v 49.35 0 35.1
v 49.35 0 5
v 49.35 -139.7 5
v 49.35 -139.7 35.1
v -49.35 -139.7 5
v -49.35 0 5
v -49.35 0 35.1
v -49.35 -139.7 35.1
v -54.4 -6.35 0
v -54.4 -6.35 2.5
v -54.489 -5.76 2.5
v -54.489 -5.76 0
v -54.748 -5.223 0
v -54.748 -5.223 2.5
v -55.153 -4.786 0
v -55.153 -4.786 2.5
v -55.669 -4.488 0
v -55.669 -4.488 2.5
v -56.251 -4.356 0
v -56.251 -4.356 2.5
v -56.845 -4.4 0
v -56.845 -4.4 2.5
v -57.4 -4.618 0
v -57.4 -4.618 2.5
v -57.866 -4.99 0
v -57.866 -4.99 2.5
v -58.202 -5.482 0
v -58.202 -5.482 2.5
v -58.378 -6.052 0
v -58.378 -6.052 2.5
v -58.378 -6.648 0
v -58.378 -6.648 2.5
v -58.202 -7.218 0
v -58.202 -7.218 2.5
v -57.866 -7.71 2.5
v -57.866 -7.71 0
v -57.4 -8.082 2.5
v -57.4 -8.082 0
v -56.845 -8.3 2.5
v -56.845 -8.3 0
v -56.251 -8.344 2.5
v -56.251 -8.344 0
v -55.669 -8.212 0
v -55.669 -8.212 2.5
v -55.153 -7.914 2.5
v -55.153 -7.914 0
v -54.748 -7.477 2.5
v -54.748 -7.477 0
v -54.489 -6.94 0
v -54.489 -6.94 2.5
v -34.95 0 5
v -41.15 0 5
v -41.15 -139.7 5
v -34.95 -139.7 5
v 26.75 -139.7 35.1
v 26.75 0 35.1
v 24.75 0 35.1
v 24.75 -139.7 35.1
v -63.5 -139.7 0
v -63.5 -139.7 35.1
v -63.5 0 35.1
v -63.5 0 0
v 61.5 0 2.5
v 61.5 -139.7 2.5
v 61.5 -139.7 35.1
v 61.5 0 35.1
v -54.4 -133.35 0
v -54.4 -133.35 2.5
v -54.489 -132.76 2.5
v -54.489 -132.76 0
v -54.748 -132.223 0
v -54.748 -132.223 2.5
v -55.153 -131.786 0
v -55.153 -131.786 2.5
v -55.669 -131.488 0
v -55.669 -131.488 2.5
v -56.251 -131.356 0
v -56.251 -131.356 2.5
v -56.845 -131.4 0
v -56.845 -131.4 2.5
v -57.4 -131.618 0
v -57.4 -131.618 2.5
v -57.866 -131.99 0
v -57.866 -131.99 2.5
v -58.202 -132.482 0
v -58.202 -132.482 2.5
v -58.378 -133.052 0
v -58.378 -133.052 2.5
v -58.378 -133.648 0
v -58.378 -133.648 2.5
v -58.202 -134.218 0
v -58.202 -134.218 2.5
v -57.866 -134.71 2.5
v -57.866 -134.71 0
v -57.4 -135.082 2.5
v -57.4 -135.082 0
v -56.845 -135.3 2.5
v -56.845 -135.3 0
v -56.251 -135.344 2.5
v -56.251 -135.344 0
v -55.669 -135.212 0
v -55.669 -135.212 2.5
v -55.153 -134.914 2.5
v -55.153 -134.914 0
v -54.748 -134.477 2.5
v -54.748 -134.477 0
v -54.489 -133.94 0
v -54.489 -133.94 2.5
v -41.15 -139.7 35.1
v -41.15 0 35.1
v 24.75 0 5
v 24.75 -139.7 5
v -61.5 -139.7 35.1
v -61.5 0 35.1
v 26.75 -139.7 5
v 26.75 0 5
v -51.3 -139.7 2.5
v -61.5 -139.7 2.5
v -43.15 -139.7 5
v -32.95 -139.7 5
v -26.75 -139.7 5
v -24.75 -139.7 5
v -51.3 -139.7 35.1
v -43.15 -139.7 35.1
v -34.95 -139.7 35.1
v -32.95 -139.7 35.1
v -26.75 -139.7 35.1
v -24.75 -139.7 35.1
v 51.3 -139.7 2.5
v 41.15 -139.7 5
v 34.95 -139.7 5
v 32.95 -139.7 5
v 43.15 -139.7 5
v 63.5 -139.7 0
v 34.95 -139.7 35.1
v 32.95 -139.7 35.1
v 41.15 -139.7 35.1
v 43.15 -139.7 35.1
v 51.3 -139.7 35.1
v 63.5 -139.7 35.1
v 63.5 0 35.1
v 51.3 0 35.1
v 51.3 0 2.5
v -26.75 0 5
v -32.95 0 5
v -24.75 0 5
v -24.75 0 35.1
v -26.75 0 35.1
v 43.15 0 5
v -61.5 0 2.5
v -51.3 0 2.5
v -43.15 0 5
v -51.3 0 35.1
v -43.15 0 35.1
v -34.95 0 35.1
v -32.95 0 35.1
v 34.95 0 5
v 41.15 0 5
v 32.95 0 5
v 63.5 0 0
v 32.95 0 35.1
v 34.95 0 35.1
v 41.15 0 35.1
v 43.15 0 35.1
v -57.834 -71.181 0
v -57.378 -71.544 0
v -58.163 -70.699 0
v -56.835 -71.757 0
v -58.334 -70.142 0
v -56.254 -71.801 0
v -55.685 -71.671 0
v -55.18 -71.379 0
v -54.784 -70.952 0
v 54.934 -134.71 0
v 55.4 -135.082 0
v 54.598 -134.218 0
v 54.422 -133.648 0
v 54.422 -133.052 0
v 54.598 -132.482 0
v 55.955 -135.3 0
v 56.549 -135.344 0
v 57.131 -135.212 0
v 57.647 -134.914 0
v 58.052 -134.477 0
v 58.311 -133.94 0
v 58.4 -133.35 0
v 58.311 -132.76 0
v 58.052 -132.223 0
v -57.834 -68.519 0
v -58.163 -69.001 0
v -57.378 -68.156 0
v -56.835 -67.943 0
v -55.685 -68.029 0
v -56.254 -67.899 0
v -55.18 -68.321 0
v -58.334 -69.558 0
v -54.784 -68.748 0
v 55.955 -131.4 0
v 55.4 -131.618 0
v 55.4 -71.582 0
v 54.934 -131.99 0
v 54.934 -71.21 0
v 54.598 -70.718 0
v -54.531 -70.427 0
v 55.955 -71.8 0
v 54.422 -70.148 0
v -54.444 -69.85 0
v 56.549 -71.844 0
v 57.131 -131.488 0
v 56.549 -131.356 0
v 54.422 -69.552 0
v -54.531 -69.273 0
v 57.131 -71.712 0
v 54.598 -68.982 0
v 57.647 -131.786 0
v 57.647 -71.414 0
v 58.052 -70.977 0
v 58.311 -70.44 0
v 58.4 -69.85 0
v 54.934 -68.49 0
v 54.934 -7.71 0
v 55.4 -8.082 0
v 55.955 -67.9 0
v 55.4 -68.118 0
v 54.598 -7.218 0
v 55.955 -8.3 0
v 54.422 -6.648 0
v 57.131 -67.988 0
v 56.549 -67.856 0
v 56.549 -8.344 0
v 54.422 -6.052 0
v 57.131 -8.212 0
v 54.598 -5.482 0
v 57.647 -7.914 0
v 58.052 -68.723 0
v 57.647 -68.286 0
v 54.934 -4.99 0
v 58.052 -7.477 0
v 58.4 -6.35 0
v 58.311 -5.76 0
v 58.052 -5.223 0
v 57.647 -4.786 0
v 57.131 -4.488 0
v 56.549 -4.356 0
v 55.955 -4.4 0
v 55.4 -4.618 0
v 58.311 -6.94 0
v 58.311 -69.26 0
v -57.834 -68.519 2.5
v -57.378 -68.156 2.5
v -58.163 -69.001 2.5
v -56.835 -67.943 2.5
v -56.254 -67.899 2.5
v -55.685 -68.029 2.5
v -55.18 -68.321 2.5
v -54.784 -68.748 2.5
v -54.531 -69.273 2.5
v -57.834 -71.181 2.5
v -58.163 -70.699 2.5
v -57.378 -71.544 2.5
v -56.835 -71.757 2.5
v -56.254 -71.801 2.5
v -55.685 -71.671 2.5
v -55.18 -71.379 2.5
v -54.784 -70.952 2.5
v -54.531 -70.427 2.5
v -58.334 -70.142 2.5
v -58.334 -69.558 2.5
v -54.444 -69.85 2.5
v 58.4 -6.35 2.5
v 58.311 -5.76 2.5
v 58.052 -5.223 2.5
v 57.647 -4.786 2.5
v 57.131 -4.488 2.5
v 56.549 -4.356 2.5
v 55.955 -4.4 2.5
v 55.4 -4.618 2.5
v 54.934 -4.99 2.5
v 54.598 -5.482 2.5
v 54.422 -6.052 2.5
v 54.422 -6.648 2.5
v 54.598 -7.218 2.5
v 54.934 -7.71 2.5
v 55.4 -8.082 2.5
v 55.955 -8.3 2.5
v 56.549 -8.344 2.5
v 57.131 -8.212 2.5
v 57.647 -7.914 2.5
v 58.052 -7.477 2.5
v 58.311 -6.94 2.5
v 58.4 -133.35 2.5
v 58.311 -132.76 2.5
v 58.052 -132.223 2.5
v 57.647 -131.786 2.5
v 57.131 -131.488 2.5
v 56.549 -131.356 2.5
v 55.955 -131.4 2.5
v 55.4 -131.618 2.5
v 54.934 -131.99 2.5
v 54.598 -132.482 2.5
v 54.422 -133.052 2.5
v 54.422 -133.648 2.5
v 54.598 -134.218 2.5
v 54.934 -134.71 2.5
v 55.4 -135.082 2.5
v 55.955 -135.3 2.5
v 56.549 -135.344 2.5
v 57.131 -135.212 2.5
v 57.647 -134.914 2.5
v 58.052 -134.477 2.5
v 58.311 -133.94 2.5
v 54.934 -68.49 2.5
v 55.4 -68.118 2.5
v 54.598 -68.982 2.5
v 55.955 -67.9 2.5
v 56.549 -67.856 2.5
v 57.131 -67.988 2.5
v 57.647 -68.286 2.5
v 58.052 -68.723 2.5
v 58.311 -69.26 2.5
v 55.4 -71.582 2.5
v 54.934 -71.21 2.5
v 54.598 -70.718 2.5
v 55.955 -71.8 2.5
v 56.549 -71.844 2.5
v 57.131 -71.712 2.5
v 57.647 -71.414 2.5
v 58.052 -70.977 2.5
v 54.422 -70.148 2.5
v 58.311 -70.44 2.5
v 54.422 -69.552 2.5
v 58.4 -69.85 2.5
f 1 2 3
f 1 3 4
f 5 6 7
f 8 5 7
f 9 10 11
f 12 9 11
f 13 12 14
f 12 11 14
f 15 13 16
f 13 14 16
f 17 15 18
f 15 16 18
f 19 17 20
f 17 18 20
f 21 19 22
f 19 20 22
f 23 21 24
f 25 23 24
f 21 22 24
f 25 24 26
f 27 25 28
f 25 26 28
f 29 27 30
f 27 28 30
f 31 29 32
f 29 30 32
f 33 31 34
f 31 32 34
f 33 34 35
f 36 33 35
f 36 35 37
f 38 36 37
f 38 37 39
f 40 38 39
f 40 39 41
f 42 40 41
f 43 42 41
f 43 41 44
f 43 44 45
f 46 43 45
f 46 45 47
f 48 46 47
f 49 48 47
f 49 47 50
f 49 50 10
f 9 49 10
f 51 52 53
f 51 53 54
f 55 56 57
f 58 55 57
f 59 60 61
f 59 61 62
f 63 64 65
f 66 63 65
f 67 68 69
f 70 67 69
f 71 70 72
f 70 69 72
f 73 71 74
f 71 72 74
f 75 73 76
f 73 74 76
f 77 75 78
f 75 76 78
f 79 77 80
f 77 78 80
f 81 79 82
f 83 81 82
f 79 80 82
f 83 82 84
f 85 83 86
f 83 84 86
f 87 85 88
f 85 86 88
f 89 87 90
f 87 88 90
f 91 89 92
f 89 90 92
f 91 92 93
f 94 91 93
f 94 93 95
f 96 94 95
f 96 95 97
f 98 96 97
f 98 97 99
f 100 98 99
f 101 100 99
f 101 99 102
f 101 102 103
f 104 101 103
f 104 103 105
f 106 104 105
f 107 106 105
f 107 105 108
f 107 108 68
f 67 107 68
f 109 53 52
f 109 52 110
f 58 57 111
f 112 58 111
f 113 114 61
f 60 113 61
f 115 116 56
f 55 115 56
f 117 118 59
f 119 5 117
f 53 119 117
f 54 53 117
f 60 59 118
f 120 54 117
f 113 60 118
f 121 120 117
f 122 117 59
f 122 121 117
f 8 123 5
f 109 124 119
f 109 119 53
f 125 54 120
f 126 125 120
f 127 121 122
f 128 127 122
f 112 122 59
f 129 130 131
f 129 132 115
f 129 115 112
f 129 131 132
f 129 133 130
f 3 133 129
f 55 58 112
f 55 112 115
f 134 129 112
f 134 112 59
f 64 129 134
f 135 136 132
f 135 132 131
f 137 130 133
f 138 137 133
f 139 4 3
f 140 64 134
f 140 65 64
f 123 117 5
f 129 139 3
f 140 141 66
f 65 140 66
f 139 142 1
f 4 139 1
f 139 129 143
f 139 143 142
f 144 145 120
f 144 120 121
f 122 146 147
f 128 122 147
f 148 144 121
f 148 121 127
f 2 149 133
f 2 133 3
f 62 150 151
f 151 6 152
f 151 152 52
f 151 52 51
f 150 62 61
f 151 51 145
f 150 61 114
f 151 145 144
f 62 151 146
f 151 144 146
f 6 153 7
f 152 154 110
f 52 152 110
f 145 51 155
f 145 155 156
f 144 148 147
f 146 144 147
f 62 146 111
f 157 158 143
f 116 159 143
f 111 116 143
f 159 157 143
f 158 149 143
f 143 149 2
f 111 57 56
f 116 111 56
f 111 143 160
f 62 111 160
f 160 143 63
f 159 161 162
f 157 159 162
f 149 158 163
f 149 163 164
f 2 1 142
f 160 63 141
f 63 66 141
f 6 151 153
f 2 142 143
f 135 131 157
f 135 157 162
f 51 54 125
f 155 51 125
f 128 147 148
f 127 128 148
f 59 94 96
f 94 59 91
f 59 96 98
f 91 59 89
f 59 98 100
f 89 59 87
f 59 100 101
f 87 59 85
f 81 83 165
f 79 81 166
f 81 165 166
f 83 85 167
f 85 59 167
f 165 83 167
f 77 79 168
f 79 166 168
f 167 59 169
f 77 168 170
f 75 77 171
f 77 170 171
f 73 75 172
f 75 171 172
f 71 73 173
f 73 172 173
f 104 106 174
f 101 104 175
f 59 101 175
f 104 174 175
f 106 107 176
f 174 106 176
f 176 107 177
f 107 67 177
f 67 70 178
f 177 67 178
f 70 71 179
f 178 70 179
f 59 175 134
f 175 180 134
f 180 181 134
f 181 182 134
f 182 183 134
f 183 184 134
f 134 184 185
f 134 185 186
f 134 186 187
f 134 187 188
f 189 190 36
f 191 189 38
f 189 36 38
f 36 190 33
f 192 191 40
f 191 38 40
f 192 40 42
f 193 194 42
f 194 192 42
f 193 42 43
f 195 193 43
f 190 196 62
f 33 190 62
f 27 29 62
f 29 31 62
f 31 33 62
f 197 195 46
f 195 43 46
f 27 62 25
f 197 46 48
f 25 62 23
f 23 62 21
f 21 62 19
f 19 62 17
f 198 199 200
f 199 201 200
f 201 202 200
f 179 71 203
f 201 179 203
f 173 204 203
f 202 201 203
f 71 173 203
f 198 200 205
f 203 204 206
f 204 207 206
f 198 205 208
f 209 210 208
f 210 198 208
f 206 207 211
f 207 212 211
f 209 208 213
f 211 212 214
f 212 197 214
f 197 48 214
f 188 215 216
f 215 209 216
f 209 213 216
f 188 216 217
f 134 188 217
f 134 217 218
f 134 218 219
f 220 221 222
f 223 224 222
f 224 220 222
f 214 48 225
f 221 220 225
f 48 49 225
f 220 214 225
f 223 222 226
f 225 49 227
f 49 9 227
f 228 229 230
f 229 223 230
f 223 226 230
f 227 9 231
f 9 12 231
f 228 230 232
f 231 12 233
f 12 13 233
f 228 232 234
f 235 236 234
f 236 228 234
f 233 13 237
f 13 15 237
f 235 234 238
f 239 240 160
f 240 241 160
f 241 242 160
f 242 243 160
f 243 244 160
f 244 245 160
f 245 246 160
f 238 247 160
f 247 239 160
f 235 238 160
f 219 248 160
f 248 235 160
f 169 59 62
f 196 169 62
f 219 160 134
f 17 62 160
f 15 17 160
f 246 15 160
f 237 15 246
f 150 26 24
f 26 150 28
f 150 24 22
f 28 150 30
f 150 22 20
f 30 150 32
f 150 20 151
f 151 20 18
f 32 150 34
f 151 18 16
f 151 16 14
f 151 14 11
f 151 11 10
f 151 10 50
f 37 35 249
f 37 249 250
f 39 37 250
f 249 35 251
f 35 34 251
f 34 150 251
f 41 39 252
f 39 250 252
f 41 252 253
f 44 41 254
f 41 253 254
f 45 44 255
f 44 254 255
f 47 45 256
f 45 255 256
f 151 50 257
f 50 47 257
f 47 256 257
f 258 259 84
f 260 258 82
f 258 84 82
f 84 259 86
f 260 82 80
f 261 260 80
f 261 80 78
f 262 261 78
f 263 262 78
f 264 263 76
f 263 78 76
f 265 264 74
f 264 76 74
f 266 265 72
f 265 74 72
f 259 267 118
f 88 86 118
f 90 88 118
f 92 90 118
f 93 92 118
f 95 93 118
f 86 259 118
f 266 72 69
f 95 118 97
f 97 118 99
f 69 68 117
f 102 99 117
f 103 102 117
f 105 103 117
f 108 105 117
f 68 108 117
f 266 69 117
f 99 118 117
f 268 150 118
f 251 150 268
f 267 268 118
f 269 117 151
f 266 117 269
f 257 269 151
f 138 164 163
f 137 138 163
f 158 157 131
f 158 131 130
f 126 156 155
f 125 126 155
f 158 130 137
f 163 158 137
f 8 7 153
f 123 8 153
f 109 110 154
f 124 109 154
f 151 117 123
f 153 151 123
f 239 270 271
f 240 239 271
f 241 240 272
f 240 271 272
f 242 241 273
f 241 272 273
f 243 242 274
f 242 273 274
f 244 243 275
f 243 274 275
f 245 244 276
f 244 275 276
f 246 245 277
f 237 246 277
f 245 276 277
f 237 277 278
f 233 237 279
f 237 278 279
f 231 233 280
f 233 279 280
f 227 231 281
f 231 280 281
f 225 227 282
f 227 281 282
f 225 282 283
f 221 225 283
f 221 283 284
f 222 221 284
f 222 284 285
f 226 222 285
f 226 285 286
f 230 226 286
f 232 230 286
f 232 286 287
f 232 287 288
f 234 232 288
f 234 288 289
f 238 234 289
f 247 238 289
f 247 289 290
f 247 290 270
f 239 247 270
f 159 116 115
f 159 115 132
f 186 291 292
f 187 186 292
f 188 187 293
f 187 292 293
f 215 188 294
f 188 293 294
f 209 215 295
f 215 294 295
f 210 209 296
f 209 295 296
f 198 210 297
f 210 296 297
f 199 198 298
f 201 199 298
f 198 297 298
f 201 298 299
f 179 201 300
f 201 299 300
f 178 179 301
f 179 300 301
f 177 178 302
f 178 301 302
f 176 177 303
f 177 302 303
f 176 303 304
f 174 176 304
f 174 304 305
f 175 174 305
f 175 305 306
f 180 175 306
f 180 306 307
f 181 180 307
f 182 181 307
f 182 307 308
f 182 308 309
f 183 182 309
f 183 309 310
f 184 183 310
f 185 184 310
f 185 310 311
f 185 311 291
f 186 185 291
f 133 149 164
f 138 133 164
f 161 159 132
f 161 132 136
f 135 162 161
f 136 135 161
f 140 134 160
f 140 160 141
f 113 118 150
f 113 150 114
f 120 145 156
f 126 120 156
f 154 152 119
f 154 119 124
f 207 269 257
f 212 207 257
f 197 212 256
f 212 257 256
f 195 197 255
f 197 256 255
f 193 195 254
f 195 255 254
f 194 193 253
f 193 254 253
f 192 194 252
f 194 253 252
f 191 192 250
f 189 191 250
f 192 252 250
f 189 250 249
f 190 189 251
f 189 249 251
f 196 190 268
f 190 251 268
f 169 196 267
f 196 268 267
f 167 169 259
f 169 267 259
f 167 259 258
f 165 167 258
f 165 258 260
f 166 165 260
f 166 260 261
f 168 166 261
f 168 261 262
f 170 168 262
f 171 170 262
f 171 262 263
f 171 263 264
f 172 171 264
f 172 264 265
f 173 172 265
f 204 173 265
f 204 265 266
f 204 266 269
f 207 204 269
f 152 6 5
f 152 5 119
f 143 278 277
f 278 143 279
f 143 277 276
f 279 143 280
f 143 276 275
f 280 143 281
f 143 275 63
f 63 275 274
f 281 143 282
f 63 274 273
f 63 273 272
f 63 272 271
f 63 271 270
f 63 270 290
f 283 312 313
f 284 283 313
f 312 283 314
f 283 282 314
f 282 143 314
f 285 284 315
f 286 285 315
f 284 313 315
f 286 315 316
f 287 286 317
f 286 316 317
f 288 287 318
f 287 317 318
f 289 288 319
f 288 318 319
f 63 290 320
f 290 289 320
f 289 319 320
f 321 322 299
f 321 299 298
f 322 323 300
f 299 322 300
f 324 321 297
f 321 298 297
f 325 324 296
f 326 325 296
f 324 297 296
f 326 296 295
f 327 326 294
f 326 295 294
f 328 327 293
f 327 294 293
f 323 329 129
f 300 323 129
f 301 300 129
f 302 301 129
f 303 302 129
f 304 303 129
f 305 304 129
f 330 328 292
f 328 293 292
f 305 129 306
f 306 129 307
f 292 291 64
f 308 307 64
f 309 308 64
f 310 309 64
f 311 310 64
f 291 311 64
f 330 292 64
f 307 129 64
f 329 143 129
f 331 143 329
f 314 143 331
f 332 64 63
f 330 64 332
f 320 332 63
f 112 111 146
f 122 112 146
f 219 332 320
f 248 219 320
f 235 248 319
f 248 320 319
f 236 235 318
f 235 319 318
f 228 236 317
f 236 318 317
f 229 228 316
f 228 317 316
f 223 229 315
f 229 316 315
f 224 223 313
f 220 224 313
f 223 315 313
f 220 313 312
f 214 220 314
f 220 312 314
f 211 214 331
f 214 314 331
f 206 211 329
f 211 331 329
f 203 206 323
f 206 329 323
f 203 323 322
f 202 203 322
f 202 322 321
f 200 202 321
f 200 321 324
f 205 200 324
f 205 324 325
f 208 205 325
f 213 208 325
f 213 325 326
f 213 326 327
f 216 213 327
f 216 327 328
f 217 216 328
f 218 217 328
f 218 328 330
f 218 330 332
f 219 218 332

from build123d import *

# Parameters (mm, degrees)
F1_DEPTH = 139.7
F2_W     = 10.2
F2_H     = 32.6
F3_DEPTH = 150
F4_W     = 6.2
F4_H     = 32.647062
F4_H_2   = 32.911505
F4_H_3   = 34.58407
F4_H_4   = 35.141594
F4_H_5   = 35.977877
F4_H_6   = 40.159295
F5_DEPTH = 150
F6_DEPTH = 150
F7_R     = 2
F7_R_2   = 1.956251
F8_DEPTH = 25


with BuildPart() as f1:
    # F0 (on Front) → F1 (new body)
    with BuildSketch(Plane.XZ):
        Polygon((-24.75, 35.1), (-63.5, 35.1), (-63.5, 0), (63.5, 0), (63.5, 35.1), (24.75, 35.1), (24.75, 5), (-24.75, 5), align=None)
    extrude(amount=F1_DEPTH)

    # F2 (on face) → F3 (cut)
    with BuildSketch(Plane.XZ.offset(139.7)):
        with Locations((-56.4, 18.8)):
            Rectangle(F2_W, F2_H)
        with Locations((56.4, 18.8)):
            Rectangle(F2_W, F2_H)
    extrude(amount=-F3_DEPTH, mode=Mode.SUBTRACT)

    # F4 (on Front) → F5 (cut)
    with BuildSketch(Plane.XZ):
        with Locations((-29.85, 21.323531)):
            Rectangle(F4_W, F4_H)
        with Locations((-38.05, 21.455752)):
            Rectangle(F4_W, F4_H_2)
        with Locations((-46.25, 22.292035)):
            Rectangle(F4_W, F4_H_3)
        with Locations((29.85, 22.570797)):
            Rectangle(F4_W, F4_H_4)
        with Locations((38.05, 22.988938)):
            Rectangle(F4_W, F4_H_5)
        with Locations((46.25, 25.079648)):
            Rectangle(F4_W, F4_H_6)
    extrude(amount=-F5_DEPTH, mode=Mode.SUBTRACT)

    # F4 (on Front) → F6 (cut)
    with BuildSketch(Plane.XZ):
        with Locations((-29.85, 21.323531)):
            Rectangle(F4_W, F4_H)
        with Locations((-38.05, 21.455752)):
            Rectangle(F4_W, F4_H_2)
        with Locations((-46.25, 22.292035)):
            Rectangle(F4_W, F4_H_3)
        with Locations((29.85, 22.570797)):
            Rectangle(F4_W, F4_H_4)
        with Locations((38.05, 22.988938)):
            Rectangle(F4_W, F4_H_5)
        with Locations((46.25, 25.079648)):
            Rectangle(F4_W, F4_H_6)
    extrude(amount=F6_DEPTH, mode=Mode.SUBTRACT)

    # F7 (on face) → F8 (cut)
    with BuildSketch(Plane.XY.offset(2.5)):
        with Locations((-56.4, -6.35)):
            Circle(F7_R)
        with Locations((56.4, -6.35)):
            Circle(F7_R)
        with Locations((-56.4, -69.85)):
            Circle(F7_R_2)
        with Locations((56.4, -69.85)):
            Circle(F7_R)
        with Locations((-56.4, -133.35)):
            Circle(F7_R)
        with Locations((56.4, -133.35)):
            Circle(F7_R)
    extrude(amount=-F8_DEPTH, mode=Mode.SUBTRACT)


solid = f1.part
